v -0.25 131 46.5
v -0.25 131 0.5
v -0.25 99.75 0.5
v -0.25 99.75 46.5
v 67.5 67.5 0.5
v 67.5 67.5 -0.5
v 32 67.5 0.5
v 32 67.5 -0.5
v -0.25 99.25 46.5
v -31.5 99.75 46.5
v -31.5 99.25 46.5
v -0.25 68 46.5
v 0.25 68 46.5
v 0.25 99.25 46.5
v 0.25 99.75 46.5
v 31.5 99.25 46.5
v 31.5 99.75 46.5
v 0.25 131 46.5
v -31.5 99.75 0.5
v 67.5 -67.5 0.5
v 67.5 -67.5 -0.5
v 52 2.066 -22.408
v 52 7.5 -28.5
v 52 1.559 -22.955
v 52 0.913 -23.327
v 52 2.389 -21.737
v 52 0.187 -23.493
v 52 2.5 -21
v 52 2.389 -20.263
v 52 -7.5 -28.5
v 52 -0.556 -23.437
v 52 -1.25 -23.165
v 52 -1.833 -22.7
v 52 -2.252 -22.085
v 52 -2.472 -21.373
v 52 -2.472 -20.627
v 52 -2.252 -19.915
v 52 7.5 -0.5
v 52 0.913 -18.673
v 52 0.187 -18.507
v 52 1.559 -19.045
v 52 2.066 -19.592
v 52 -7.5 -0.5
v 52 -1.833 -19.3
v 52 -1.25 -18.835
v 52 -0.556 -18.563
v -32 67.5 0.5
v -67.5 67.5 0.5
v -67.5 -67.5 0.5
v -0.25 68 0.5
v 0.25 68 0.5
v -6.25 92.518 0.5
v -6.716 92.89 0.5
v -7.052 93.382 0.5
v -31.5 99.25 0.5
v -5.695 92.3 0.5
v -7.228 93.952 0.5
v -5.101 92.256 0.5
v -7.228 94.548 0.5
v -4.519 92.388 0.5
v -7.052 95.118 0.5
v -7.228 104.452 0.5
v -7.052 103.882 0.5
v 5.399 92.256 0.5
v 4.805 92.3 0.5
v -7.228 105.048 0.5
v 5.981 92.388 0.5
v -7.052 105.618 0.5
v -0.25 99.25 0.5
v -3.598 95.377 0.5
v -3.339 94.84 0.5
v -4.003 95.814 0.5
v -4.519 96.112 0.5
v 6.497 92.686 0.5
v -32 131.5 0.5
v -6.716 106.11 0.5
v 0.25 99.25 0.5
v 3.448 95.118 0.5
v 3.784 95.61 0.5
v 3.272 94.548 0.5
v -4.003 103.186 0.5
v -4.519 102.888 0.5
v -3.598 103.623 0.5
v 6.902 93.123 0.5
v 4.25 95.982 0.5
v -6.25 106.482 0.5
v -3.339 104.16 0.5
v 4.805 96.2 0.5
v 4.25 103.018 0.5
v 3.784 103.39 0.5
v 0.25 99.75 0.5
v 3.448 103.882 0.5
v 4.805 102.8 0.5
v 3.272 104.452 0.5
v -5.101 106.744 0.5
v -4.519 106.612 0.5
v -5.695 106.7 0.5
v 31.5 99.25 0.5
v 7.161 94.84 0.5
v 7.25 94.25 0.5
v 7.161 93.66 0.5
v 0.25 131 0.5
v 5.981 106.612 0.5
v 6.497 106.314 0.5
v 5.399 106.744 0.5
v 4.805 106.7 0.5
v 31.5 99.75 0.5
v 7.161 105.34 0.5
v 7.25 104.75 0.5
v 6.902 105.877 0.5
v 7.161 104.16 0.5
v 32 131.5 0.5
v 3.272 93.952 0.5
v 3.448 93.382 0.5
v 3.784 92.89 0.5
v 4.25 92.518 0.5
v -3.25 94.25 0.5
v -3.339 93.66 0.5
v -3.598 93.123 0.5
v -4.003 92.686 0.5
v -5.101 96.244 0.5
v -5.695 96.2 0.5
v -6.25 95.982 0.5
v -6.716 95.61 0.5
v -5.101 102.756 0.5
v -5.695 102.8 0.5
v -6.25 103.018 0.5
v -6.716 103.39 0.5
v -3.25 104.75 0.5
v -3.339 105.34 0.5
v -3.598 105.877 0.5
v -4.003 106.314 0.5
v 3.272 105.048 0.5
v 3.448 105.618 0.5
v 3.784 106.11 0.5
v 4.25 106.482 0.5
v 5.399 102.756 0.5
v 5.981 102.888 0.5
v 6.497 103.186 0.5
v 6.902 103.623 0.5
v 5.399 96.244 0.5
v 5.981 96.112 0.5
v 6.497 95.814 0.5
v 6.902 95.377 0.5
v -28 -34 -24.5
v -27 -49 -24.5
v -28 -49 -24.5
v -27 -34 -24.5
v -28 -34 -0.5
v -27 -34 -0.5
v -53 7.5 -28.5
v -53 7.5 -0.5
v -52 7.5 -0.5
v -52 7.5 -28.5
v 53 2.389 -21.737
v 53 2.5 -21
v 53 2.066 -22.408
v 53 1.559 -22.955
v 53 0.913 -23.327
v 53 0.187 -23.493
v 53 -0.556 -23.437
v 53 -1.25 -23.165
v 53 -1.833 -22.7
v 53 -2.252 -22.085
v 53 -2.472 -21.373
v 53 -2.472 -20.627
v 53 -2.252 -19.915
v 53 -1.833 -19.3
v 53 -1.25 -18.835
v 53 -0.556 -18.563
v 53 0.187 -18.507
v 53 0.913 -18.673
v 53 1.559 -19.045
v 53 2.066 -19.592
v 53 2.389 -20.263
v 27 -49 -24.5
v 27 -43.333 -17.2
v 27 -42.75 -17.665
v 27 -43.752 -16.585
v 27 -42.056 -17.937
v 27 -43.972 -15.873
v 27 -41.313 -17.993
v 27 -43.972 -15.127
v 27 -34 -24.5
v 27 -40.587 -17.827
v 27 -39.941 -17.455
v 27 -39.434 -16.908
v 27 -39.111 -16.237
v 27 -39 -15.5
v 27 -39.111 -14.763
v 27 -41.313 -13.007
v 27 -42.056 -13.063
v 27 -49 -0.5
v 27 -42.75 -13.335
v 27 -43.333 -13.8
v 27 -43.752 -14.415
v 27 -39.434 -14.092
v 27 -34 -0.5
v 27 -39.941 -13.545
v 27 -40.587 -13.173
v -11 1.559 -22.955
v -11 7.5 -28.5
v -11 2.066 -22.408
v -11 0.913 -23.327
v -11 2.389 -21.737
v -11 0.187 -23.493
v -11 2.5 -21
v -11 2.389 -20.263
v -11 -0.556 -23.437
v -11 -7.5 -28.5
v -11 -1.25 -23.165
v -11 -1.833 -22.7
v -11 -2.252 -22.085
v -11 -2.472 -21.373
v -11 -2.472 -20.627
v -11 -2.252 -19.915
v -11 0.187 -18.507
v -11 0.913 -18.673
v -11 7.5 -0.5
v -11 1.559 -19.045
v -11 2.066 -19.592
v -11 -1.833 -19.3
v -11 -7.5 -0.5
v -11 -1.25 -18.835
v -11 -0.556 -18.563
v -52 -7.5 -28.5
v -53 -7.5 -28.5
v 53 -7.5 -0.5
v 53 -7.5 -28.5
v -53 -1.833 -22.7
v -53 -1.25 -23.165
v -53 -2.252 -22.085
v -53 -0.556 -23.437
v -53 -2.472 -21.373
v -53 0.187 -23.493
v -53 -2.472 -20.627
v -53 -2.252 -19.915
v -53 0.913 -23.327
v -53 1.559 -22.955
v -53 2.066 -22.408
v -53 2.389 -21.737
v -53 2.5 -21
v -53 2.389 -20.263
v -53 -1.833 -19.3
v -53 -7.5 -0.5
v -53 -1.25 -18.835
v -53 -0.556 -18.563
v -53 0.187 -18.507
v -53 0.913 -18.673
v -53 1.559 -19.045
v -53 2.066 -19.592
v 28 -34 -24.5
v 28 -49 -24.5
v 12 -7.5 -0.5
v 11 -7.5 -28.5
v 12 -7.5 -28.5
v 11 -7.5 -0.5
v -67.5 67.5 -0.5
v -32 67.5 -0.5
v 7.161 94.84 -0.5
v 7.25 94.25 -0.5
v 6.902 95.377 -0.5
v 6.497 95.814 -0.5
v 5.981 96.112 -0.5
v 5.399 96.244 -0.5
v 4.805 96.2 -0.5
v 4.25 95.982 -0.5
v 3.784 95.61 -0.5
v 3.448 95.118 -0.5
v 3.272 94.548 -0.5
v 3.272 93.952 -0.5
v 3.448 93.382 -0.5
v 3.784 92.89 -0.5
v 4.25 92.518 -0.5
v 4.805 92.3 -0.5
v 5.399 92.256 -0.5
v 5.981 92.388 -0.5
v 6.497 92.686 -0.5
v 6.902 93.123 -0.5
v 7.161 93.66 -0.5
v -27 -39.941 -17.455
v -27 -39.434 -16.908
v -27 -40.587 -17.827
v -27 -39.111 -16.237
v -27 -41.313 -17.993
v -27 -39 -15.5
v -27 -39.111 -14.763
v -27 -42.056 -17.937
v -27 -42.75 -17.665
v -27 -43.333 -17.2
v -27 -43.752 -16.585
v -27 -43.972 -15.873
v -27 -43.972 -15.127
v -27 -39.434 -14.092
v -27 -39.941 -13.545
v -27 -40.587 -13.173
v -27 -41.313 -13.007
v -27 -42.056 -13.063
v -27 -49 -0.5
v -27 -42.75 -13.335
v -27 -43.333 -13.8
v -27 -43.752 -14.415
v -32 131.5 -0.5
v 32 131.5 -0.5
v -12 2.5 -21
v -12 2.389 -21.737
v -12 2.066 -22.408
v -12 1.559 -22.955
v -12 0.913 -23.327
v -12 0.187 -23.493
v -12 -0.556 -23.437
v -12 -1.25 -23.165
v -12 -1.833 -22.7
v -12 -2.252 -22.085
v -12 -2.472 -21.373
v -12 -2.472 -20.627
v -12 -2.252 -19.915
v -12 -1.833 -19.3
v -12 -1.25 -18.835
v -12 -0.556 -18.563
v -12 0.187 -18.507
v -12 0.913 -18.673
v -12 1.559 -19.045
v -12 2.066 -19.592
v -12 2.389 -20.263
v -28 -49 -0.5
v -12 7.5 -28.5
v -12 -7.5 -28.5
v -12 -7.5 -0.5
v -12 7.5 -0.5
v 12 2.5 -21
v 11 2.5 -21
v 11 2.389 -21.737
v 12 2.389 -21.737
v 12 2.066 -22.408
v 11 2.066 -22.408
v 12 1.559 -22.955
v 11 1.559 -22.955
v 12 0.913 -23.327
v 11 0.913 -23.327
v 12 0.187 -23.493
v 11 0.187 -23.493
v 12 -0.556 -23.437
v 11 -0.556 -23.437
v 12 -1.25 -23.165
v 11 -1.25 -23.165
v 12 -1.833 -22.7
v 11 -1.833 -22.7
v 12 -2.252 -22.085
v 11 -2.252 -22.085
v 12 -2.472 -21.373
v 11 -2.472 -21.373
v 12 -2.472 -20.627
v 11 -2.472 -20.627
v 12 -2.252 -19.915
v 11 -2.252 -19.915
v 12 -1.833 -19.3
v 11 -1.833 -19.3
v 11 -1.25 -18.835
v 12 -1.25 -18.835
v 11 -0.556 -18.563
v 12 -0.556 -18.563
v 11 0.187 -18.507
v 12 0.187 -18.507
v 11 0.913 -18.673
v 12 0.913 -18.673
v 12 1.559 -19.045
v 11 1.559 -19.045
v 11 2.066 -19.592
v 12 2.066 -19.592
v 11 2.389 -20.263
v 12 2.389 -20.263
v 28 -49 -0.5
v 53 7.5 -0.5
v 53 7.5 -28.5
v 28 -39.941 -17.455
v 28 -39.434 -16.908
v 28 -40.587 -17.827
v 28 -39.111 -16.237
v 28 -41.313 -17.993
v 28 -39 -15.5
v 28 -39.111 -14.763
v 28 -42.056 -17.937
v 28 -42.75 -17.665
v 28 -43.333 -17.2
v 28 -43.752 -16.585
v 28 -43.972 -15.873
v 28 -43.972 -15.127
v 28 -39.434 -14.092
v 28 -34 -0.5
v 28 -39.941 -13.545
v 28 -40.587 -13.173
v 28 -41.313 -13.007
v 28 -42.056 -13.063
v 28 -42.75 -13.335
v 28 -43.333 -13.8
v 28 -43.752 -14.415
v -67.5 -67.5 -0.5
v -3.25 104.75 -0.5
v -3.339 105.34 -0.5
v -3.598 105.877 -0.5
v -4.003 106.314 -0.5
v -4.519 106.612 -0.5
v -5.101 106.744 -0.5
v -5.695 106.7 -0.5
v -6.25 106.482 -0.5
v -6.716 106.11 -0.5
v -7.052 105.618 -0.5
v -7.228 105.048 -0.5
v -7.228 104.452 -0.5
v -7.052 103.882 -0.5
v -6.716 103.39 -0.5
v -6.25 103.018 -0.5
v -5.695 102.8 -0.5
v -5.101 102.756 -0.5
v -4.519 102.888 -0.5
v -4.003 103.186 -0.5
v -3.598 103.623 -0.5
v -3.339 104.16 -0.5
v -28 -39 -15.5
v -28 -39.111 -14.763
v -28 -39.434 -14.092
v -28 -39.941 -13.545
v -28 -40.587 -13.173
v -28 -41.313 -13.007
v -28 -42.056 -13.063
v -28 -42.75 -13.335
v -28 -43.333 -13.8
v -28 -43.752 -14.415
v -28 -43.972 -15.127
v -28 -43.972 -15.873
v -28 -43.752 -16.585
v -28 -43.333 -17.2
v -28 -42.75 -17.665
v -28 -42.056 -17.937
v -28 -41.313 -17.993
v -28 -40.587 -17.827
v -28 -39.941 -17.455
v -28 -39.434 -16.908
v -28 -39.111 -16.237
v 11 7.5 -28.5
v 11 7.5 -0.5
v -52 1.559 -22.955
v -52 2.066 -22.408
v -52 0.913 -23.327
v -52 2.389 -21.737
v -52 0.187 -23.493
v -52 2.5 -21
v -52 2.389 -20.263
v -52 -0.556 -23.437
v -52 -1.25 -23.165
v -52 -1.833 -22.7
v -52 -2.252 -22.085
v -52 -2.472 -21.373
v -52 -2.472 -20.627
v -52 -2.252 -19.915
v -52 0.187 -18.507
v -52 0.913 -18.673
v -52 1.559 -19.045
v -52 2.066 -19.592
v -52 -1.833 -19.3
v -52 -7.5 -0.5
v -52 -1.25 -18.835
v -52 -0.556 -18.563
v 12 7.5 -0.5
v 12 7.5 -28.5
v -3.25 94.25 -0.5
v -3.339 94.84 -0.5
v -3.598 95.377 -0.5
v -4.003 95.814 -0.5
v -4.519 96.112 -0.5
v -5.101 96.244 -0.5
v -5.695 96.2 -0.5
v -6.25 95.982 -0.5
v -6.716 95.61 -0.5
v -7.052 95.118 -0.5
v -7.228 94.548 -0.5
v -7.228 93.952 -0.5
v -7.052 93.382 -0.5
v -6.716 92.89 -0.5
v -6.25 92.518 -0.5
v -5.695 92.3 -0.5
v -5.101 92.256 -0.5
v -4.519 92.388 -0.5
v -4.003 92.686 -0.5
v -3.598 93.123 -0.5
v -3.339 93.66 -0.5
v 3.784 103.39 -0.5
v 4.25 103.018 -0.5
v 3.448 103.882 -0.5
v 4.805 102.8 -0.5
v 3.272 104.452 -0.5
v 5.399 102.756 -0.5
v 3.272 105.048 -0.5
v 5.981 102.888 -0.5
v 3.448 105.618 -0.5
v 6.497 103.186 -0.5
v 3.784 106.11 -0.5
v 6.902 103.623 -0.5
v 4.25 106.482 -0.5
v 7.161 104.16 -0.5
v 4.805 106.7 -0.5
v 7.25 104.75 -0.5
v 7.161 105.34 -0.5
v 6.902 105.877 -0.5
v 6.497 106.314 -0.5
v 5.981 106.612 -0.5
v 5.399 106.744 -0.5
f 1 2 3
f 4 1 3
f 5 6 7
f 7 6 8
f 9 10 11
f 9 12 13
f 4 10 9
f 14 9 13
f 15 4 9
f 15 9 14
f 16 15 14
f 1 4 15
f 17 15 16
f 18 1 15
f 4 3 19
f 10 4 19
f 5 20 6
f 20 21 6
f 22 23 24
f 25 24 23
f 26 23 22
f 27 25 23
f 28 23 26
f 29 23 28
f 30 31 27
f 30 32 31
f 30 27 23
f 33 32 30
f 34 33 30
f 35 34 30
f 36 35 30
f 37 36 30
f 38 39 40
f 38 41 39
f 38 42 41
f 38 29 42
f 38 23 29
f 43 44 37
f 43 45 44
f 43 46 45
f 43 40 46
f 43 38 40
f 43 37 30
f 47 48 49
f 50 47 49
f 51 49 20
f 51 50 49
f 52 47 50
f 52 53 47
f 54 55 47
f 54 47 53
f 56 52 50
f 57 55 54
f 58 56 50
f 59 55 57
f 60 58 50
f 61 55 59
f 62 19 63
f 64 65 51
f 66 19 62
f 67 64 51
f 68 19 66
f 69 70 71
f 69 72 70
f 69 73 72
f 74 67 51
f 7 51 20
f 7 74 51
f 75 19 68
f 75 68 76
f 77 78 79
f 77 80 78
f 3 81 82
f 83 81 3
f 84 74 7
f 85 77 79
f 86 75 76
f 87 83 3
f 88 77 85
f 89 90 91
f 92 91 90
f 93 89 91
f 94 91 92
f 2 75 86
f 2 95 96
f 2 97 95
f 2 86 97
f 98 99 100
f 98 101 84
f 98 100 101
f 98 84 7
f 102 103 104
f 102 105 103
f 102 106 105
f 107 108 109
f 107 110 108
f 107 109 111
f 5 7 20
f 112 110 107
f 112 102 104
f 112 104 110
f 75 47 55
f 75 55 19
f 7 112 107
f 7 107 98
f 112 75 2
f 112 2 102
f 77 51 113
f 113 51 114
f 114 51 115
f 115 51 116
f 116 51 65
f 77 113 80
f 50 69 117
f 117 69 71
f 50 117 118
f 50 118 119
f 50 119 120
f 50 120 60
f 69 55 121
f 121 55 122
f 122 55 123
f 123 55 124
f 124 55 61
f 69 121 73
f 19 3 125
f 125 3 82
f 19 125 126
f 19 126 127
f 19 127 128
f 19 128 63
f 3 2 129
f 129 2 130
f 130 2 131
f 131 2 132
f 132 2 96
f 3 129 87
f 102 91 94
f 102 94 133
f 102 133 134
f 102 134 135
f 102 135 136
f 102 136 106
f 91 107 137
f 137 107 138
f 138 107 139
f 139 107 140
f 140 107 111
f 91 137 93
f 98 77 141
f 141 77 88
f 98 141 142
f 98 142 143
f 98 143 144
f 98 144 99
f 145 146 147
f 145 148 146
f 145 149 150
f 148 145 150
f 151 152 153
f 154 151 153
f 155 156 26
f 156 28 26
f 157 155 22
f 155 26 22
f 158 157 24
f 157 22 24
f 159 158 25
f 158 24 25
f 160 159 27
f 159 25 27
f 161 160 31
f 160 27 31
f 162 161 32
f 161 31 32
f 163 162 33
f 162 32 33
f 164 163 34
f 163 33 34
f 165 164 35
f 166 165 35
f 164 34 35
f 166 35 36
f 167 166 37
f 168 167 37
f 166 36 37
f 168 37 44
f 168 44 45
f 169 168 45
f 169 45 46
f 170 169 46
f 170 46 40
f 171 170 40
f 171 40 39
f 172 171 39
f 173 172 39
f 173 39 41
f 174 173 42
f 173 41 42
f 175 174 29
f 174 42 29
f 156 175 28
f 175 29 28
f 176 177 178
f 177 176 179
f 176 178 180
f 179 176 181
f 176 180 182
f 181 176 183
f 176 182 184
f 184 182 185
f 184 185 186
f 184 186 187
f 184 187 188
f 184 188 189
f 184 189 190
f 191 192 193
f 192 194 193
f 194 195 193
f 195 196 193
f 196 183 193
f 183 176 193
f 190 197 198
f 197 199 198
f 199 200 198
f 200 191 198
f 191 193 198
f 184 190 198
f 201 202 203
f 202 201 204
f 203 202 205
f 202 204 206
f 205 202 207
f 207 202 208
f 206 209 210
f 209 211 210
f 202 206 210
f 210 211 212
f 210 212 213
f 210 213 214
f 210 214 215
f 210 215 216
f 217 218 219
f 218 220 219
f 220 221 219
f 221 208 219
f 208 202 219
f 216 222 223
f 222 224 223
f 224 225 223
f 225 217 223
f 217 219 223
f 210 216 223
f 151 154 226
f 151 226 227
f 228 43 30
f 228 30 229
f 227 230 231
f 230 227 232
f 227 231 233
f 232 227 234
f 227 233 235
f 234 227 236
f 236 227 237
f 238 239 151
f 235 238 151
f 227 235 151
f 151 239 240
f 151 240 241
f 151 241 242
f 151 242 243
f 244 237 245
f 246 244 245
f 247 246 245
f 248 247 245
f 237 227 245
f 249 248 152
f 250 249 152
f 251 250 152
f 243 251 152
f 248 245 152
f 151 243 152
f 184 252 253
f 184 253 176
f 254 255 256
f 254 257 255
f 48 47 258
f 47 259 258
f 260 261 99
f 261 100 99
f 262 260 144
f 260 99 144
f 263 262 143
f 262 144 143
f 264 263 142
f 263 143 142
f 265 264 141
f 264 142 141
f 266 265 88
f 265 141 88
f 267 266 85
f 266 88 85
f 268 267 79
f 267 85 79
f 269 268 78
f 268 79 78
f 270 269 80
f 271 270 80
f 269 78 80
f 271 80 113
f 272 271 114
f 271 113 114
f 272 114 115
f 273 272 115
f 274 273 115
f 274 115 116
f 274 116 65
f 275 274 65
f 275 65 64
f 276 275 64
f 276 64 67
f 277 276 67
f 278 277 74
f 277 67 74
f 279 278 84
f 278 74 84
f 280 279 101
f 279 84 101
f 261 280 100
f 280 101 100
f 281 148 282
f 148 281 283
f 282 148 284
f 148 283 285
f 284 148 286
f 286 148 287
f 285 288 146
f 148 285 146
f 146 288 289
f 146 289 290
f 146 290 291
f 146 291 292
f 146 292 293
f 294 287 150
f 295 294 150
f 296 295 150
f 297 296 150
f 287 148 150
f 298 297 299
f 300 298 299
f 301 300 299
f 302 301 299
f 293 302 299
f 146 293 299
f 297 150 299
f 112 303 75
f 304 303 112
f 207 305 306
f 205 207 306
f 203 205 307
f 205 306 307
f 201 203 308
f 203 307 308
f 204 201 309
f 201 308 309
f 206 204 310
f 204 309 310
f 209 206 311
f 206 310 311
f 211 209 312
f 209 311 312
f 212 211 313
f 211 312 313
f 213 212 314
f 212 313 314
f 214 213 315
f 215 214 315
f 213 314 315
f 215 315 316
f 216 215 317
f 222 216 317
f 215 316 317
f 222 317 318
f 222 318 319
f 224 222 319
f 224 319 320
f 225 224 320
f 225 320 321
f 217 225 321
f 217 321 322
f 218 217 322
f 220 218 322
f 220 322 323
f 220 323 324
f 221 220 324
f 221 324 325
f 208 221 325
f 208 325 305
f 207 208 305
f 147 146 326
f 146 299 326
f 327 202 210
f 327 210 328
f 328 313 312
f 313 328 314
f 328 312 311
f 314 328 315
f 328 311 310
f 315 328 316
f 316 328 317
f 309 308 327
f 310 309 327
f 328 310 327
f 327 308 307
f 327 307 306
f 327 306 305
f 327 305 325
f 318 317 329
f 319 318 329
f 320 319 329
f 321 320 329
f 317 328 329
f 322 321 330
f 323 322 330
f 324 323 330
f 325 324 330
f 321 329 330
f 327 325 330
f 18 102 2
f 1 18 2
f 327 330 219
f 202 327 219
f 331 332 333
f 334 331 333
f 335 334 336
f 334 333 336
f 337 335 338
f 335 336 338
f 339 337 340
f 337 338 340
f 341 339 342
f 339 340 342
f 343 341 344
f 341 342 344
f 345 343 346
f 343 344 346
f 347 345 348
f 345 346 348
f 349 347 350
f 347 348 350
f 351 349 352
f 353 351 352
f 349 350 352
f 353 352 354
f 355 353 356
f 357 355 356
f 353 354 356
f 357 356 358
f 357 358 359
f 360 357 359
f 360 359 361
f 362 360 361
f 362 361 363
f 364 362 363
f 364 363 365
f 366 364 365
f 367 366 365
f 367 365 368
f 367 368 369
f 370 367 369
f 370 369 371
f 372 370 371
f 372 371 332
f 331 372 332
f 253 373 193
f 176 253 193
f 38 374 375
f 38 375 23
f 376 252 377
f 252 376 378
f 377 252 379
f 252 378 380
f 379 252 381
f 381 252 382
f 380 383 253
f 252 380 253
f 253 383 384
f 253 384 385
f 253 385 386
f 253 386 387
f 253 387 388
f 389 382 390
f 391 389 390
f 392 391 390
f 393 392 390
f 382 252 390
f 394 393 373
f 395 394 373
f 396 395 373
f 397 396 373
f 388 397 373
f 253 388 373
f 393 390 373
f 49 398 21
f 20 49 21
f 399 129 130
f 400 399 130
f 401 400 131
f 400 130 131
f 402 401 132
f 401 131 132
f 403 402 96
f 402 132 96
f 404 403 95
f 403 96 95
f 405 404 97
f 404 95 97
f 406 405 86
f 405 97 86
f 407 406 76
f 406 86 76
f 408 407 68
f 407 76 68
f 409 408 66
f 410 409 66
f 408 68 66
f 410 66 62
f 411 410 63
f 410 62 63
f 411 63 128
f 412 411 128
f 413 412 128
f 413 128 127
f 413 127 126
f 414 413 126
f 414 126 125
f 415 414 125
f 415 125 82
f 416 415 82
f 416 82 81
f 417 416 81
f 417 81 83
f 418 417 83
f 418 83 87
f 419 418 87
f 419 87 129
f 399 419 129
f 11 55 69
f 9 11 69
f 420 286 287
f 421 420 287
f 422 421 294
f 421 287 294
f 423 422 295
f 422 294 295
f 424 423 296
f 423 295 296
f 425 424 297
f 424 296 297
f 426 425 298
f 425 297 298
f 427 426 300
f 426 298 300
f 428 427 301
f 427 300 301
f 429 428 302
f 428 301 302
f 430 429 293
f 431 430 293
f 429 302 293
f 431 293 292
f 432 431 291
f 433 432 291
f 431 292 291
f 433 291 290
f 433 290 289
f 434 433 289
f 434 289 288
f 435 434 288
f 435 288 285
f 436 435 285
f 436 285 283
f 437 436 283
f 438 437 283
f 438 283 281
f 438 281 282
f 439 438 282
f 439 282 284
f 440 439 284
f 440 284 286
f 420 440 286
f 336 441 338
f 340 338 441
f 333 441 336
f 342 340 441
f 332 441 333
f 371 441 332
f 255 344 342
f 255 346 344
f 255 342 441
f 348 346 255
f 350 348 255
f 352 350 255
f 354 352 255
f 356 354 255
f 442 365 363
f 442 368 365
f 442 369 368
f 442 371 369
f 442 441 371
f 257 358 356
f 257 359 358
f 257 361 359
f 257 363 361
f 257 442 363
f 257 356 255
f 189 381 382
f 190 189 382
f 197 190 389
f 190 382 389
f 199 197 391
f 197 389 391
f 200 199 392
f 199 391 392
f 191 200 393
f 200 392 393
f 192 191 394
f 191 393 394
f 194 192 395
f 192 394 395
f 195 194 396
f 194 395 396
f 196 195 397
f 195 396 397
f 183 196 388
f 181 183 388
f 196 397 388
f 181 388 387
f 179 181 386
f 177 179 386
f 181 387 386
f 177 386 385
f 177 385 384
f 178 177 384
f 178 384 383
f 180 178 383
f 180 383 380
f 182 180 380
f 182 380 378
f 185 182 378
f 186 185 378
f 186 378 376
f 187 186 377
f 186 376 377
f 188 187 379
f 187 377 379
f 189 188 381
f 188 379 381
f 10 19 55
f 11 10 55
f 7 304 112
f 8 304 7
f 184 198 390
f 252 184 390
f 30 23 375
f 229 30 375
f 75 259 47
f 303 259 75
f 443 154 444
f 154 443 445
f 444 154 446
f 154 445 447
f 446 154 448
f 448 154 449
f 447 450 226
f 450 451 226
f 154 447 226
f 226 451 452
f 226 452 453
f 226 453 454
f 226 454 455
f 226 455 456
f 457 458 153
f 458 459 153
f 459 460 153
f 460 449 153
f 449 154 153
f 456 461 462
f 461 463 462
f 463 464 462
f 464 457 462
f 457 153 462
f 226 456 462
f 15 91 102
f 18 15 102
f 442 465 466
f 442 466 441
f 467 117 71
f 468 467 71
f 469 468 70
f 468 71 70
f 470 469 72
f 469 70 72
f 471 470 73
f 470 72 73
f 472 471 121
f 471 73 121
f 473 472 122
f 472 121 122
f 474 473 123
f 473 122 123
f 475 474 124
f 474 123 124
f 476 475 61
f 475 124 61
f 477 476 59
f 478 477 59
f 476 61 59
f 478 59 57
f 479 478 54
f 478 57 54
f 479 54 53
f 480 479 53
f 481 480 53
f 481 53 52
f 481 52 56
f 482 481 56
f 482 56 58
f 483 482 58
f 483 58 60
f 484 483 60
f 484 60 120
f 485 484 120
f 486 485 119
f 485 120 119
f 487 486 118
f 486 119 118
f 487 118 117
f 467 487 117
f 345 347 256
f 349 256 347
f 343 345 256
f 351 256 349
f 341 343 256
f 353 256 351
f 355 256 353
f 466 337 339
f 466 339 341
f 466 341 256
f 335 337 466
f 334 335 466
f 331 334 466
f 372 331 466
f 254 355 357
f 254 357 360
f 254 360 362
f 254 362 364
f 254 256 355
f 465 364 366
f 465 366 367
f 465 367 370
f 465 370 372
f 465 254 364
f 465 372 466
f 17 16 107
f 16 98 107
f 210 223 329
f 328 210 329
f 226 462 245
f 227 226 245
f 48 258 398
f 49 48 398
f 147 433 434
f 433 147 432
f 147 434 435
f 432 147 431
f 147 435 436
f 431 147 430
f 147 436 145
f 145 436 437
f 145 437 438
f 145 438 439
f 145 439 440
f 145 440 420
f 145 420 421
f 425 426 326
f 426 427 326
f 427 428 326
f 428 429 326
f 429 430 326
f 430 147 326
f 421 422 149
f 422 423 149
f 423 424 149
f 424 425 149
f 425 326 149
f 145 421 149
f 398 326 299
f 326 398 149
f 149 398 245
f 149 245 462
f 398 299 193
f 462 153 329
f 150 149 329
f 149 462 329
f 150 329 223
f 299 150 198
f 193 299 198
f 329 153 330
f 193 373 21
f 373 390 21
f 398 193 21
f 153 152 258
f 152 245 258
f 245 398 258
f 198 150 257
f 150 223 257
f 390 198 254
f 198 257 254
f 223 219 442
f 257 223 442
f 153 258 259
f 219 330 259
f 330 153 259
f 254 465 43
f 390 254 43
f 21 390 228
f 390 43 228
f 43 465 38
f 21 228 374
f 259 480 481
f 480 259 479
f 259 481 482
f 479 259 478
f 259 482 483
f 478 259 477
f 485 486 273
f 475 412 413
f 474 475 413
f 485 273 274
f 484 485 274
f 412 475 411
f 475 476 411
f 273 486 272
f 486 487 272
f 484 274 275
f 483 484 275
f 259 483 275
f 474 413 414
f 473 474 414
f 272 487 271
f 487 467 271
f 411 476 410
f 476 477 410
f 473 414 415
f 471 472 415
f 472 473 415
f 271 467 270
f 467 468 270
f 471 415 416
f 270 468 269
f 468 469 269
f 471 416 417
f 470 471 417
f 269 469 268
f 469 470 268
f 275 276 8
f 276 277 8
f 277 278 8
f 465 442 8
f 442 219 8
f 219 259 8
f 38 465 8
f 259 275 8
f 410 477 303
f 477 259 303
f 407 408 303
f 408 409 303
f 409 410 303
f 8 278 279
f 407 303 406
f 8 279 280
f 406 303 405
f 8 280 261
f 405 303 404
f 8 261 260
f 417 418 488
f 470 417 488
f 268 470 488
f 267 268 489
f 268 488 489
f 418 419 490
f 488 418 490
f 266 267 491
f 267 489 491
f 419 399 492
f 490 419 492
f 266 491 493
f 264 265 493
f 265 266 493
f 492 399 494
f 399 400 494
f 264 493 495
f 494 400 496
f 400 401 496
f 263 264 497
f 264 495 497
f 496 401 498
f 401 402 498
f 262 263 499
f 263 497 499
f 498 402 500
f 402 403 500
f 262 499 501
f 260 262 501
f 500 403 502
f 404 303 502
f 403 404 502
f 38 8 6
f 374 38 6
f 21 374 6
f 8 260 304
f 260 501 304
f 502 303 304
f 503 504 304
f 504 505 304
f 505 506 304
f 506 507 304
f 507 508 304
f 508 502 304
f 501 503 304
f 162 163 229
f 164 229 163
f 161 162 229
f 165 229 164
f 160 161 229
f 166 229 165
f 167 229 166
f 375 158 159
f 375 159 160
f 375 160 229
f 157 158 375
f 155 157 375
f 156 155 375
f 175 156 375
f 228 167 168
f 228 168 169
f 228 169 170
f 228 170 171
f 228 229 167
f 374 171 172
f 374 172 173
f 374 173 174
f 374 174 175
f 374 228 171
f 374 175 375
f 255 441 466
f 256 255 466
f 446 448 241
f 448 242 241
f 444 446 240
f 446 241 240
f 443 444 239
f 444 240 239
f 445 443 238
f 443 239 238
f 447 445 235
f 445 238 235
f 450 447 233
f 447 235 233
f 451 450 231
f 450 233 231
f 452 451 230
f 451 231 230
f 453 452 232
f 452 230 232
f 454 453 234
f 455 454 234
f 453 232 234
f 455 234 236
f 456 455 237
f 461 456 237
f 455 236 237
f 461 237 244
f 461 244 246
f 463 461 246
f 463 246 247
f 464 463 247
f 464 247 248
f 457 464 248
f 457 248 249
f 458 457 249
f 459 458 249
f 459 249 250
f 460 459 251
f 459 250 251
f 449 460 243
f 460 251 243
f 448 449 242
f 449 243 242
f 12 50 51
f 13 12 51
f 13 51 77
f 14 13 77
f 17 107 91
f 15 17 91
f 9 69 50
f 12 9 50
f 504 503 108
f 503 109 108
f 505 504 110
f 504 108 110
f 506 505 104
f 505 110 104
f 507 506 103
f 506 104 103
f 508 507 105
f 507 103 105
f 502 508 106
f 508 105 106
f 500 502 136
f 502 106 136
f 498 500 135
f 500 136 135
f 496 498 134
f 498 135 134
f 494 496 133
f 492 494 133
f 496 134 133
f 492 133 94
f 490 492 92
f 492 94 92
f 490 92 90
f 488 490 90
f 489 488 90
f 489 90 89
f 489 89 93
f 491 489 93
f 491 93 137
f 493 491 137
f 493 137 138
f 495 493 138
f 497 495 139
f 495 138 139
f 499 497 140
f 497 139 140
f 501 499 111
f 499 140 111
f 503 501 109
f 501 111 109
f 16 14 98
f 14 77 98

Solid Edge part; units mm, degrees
sketch "Sketch1" plane through (0, 0, 0) normal (0, 0, 1) x (1, 0, 0)
  line L0 (-67.5, -67.5) -> (67.5, -67.5)
  line L1 (67.5, -67.5) -> (67.5, 67.5)
  line L2 (67.5, 67.5) -> (32, 67.5)
  line L3 (32, 131.5) -> (32, 67.5)
  line L4 (-32, 131.5) -> (32, 131.5)
  line L5 (-32, 67.5) -> (-32, 131.5)
  line L6 (-32, 67.5) -> (-67.5, 67.5)
  line L7 (-67.5, 67.5) -> (-67.5, -67.5)
extrude "Protrusion1" add sketch "Sketch1" along normal mid plane 1
sketch "Sketch2" plane through (0, 32, -0.5) normal (0, 0, -1) x (-1, 0, 0)
  line L0 (11, -39.5) -> (12, -39.5)
  line L1 (12, -39.5) -> (12, -24.5)
  line L2 (12, -24.5) -> (11, -24.5)
  line L3 (11, -24.5) -> (11, -39.5)
  line L4 (52, -39.5) -> (53, -39.5)
  line L5 (53, -39.5) -> (53, -24.5)
  line L6 (53, -24.5) -> (52, -24.5)
  line L7 (52, -24.5) -> (52, -39.5)
  line L8 (-11, -39.5) -> (-12, -39.5)
  line L9 (-12, -39.5) -> (-12, -24.5)
  line L10 (-12, -24.5) -> (-11, -24.5)
  line L11 (-11, -24.5) -> (-11, -39.5)
  line L12 (-52, -39.5) -> (-53, -39.5)
  line L13 (-53, -39.5) -> (-53, -24.5)
  line L14 (-53, -24.5) -> (-52, -24.5)
  line L15 (-52, -24.5) -> (-52, -39.5)
  dimension "D1" = 1
  dimension "D2" = 15
  dimension "D3" = 12
  dimension "D4" = 1
  dimension "D5" = 15
  dimension "D6" = 40
extrude "Wyciągnięcie_9" add sketch "Sketch2" along normal blind 28
sketch "Sketch3" plane through (-53, 0, -14.5) normal (-1, 0, 0) x (0, 1, 0)
  circle A0 centre (0, 6.5) radius 2.5
  dimension "D1" = 7.5
extrude "Cutout1" cut sketch "Sketch3" against normal through all
sketch "Sketch4" plane through (0, 32, -0.5) normal (0, 0, -1) x (0, 1, 0)
  line L0 (-81, 27) -> (-66, 27)
  line L1 (-66, 27) -> (-66, 28)
  line L2 (-66, 28) -> (-81, 28)
  line L3 (-81, 28) -> (-81, 27)
  line L4 (-81, -28) -> (-66, -28)
  line L5 (-66, -28) -> (-66, -27)
  line L6 (-66, -27) -> (-81, -27)
  line L7 (-81, -27) -> (-81, -28)
  dimension "D1" = 15
  dimension "D2" = 1
  dimension "D3" = 1
  dimension "D4" = 15
  dimension "D5" = 54
  dimension "D6" = 26
  dimension "D7" = 26
extrude "Wyciągnięcie_10" add sketch "Sketch4" along normal blind 24
sketch "Sketch5" plane through (28, -41.5, -12.5) normal (1, 0, 0) x (0, 1, 0)
  circle A0 centre (0, -3) radius 2.5
extrude "Cutout2" cut sketch "Sketch5" against normal up to next
sketch "Sketch6" plane through (-27, -41.5, -12.5) normal (1, 0, 0) x (0, 1, 0)
  circle A0 centre (0, -3) radius 2.5
extrude "Cutout3" cut sketch "Sketch6" against normal up to next
sketch "Sketch7" plane through (0, 32, 0.5) normal (0, 0, 1) x (1, 0, 0)
  line L0 (0.25, 67.25) -> (31.5, 67.25)
  line L1 (31.5, 67.25) -> (31.5, 67.75)
  line L2 (31.5, 67.75) -> (0.25, 67.75)
  line L3 (0.25, 67.75) -> (0.25, 99)
  line L4 (0.25, 99) -> (-0.25, 99)
  line L5 (-0.25, 99) -> (-0.25, 67.75)
  line L6 (-0.25, 67.75) -> (-31.5, 67.75)
  line L7 (-31.5, 67.75) -> (-31.5, 67.25)
  line L8 (-31.5, 67.25) -> (-0.25, 67.25)
  line L9 (-0.25, 67.25) -> (-0.25, 36)
  line L10 (-0.25, 36) -> (0.25, 36)
  line L11 (0.25, 36) -> (0.25, 67.25)
extrude "Wyciągnięcie_11" add sketch "Sketch7" along normal blind 46
sketch "Sketch8" plane through (0, 32, 0.5) normal (0, 0, 1) x (1, 0, 0)
  circle A0 centre (5.25, 62.25) radius 2
  circle A1 centre (-5.25, 62.25) radius 2
  circle A2 centre (-5.25, 72.75) radius 2
  circle A3 centre (5.25, 72.75) radius 2
  dimension "D1" = 5
  dimension "D2" = 5
  dimension "D3" = 4
  dimension "D4" = 5
  dimension "D5" = 5
  dimension "D6" = 5
  dimension "D7" = 5
  dimension "D8" = 5
  dimension "D9" = 5
  dimension "D10" = 4
  dimension "D11" = 4
  dimension "D12" = 4
extrude "Cutout4" cut sketch "Sketch8" against normal up to next
